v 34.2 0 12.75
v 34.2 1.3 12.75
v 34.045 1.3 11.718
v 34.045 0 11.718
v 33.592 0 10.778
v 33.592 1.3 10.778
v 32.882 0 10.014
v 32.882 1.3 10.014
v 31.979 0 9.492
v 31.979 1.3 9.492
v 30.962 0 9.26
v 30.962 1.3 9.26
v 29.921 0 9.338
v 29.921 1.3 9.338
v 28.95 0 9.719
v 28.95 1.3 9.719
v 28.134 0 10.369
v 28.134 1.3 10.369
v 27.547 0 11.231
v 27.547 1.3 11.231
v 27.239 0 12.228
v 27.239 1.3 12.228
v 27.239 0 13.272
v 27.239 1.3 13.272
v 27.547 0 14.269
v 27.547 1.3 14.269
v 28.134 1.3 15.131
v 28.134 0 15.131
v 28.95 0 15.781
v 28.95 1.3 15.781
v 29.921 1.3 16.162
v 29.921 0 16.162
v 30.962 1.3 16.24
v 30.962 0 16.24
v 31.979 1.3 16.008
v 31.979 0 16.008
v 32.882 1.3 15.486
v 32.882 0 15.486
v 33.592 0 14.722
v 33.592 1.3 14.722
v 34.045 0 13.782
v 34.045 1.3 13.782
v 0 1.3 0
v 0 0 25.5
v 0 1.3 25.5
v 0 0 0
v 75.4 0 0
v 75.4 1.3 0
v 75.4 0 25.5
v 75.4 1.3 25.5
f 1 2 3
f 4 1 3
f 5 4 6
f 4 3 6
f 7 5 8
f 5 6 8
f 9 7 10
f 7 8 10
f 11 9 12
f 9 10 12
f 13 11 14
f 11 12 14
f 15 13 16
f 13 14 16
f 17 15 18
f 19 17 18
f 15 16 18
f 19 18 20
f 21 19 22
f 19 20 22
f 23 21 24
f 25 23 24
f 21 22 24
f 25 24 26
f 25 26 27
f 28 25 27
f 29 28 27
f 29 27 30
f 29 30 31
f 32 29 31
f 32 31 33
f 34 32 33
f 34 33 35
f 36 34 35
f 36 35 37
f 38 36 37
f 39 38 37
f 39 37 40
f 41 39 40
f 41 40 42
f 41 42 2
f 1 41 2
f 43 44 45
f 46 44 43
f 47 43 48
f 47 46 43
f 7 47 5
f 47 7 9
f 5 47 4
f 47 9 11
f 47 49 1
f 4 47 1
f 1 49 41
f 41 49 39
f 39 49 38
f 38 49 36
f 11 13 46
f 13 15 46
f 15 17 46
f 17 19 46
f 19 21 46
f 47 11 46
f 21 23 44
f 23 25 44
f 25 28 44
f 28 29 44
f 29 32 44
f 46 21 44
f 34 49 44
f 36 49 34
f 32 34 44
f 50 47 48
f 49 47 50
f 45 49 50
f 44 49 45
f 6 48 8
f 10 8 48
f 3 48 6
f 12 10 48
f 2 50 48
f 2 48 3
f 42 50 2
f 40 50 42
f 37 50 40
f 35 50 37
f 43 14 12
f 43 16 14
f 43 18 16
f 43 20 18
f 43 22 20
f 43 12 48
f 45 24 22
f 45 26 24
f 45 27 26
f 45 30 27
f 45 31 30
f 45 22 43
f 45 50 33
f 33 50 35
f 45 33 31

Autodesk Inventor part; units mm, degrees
ref_plane "YZ Plane" through (0, 0, 0) normal (1, 0, 0) x (0, 1, 0)
ref_plane "XZ Plane" through (0, 0, 0) normal (0, 1, 0) x (-1, 0, 0)
ref_plane "XY Plane" through (0, 0, 0) normal (0, 0, 1) x (1, 0, 0)
sketch "Sketch1" plane through (0, 0, 0) normal (0, 1, 0) x (-1, 0, 0)
  line L0 (0, 0) -> (-75.4, 0)
  line L1 (-75.4, 0) -> (-75.4, 25.5)
  line L2 (-75.4, 25.5) -> (0, 25.5)
  line L3 (0, 25.5) -> (0, 0)
  dimension "d0" = 75.4
  dimension "d1" = 25.5
extrude "Extrusion1" add sketch "Sketch1" along normal blind 1.3
sketch "Sketch6" plane through (0, 1.3, 0) normal (0, 1, 0) x (1, 0, 0)
  line L0 (75.4, 0) -> (0, 0) projected
  line L1 (0, 0) -> (0, -25.5) projected
  line L2 (0, -25.5) -> (75.4, -25.5) projected
  line L3 (75.4, -25.5) -> (75.4, 0) projected
  circle A0 centre (30.7, -12.75) radius 3.5
  dimension "d20" = 7
  dimension "d24" = 30.7
extrude "Extrusion6" cut sketch "Sketch6" against normal blind 10 contours A0
properties part number "00_Microscopeslide"
